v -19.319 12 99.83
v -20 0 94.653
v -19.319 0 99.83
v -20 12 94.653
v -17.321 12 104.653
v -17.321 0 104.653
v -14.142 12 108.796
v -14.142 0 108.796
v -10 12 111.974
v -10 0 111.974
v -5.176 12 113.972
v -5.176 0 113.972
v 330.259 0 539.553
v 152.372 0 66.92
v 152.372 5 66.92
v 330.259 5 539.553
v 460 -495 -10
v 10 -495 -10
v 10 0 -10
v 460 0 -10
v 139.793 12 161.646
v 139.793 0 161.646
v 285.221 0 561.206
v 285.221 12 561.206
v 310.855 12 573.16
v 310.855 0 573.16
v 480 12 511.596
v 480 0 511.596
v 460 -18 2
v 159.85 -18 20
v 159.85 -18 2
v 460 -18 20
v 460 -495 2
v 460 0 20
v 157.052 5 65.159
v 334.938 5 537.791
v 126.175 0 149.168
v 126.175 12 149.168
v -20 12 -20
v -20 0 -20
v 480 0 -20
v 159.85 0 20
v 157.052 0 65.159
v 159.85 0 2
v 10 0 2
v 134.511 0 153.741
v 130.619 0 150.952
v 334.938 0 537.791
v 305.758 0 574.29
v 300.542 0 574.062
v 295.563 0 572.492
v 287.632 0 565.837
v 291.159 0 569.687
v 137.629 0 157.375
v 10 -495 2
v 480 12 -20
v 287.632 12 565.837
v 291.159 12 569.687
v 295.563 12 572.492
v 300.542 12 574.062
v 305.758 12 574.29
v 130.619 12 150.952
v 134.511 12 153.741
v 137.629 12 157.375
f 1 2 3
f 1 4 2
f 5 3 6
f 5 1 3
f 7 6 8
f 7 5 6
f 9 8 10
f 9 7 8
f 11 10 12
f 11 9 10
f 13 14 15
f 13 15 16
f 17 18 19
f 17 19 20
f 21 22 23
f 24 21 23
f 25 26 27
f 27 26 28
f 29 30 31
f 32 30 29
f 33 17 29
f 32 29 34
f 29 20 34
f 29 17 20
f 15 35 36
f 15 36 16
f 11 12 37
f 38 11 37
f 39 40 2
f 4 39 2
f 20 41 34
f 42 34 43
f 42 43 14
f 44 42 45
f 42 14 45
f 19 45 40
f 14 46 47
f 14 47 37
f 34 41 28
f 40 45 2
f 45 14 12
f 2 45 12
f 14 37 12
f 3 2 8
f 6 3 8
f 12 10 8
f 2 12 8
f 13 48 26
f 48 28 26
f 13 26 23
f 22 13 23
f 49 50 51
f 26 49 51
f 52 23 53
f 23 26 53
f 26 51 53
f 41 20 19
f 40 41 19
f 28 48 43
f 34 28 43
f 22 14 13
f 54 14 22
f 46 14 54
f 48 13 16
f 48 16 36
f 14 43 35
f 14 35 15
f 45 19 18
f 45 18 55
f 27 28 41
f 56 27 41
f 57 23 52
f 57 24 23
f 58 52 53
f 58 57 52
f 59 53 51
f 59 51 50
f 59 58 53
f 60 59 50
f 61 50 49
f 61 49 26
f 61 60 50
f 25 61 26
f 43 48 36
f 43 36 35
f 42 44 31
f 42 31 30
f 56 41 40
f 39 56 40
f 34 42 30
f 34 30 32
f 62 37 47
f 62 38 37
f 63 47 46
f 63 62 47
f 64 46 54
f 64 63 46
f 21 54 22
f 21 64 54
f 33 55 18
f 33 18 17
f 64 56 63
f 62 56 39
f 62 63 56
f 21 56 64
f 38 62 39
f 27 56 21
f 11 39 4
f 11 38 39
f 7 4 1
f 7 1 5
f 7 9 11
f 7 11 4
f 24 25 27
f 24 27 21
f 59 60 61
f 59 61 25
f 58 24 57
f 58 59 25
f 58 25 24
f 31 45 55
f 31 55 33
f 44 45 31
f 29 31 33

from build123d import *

# Parameters (mm, degrees)
PAD_DEPTH       = 12
POCKET_DEPTH    = 1
FILLET_R        = 20
FILLET001_R     = 20
FILLET002_R     = 20
POCKET001_DEPTH = 5
SKETCH004_W     = 450
SKETCH004_H     = 12
PAD001_DEPTH    = 495
SKETCH005_W     = 300.149746
SKETCH005_H     = 18
PAD002_DEPTH    = 18


with BuildPart() as part:
    # Sketch001 → Pad (new body)
    with BuildSketch(Plane.XZ):
        Polygon((-20, -20), (-20, 110), (136.232082, 151.86226), (292.061476, 580), (480, 511.595971), (480, -20), align=None)
    extrude(amount=-PAD_DEPTH)

    # Sketch002 (on Face7 of Pad) → Pocket (cut)
    with BuildSketch(Plane.XZ):
        Polygon((465, -5), (465, 501.092858), (301.026563, 560.774309), (147.656805, 139.394363), (-5, 98.490095), (-5, -5), align=None)
    extrude(amount=POCKET_DEPTH, mode=Mode.SUBTRACT)

    # Fillet
    fillet_edges = [part.edges().sort_by_distance(p)[0] for p in [
        (-20, 6, 110),
    ]]
    fillet(fillet_edges, radius=FILLET_R)

    # Fillet001
    fillet001_edges = [part.edges().sort_by_distance(p)[0] for p in [
        (136.232082, 6, 151.86226),
    ]]
    fillet(fillet001_edges, radius=FILLET001_R)

    # Fillet002
    fillet002_edges = [part.edges().sort_by_distance(p)[0] for p in [
        (292.061476, 6, 580),
    ]]
    fillet(fillet002_edges, radius=FILLET002_R)

    # Sketch003 (on Face7 of Pocket) → Pocket001 (cut)
    with BuildSketch(Plane.XZ):
        Polygon((334.938299, 537.791251), (157.051626, 65.158909), (152.372098, 66.920163), (330.258771, 539.552506), align=None)
    extrude(amount=-POCKET001_DEPTH, mode=Mode.SUBTRACT)

    # Sketch004 (on Face11 of Pocket001) → Pad001 (join)
    with BuildSketch(Plane.XZ):
        with Locations((235, -4)):
            Rectangle(SKETCH004_W, SKETCH004_H)
    extrude(amount=PAD001_DEPTH)

    # Sketch005 (on Face1 of Pad001) → Pad002 (join)
    with BuildSketch(Plane.XZ):
        with Locations((309.925127, 11)):
            Rectangle(SKETCH005_W, SKETCH005_H)
    extrude(amount=PAD002_DEPTH)


solid = part.part
